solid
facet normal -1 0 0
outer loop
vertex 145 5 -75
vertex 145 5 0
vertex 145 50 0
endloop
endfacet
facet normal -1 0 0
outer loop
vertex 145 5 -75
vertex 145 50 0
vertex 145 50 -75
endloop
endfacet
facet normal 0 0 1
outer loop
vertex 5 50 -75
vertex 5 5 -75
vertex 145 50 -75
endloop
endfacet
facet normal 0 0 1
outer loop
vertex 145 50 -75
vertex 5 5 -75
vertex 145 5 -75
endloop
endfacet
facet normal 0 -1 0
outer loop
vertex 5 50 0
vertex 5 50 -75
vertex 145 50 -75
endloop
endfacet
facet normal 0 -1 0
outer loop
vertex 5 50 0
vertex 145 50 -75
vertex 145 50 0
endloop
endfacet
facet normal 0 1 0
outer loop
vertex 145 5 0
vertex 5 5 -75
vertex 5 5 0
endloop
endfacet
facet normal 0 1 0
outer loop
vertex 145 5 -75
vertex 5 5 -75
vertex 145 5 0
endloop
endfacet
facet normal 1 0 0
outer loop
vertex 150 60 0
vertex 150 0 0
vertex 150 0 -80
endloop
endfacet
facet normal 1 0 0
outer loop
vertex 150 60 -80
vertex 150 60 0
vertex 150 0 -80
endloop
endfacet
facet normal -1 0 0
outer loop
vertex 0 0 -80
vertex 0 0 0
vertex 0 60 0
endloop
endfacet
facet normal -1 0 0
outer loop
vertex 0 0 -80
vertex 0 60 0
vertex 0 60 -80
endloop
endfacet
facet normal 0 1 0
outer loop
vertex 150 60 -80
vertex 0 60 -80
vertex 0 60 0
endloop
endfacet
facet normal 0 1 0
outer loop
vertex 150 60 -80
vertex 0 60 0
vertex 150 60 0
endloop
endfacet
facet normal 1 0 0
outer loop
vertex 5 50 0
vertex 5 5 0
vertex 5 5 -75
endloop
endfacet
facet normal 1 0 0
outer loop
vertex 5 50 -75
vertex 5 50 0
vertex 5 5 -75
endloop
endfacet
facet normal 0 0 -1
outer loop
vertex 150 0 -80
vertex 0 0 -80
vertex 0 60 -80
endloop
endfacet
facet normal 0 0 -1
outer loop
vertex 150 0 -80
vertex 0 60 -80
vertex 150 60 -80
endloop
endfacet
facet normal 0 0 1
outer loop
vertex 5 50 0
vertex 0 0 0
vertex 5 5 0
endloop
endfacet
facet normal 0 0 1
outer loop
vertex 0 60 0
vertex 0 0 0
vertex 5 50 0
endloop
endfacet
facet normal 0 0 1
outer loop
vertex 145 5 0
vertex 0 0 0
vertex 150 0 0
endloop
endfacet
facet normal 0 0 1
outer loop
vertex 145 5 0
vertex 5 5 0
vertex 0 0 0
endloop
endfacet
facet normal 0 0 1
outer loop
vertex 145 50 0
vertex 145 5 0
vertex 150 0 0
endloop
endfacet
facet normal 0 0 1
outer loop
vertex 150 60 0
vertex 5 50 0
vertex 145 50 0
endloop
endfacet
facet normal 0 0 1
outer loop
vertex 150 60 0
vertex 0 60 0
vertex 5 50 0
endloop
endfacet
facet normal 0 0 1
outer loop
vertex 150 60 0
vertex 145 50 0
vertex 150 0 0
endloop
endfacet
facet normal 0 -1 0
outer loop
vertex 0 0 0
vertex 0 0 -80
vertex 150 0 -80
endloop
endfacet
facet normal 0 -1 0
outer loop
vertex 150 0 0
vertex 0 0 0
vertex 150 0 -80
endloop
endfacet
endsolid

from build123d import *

# Parameters (mm, degrees)
SKETCH1_W                 = 150
SKETCH1_H                 = 80
BOSS_EXTRUDE1_DEPTH       = 60
SHELL1_T                  = -5
SHELL1_THICKNESS_2_FACE_W = 75
SHELL1_THICKNESS_2_FACE_H = 140
SHELL1_THICKNESS_2_DEPTH  = 5


with BuildPart() as part:
    # Sketch1 → Boss-Extrude1 (new body)
    with BuildSketch(Plane(origin=(0, 0, 0), x_dir=(1, 0, 0), z_dir=(0, 1, 0))):
        with Locations((75, 40)):
            Rectangle(SKETCH1_W, SKETCH1_H)
    extrude(amount=BOSS_EXTRUDE1_DEPTH)

    # Shell1
    shell1_openings = [part.faces().sort_by_distance(p)[0] for p in [
        (75, 30, 0),
    ]]
    offset(amount=SHELL1_T, openings=shell1_openings, kind=Kind.INTERSECTION)

    # Shell1 thickness 2 face (on inner face of the shell) → Shell1 thickness 2 (add)
    with BuildSketch(Plane(origin=(75, 55, -37.5), x_dir=(0, 0, 1), z_dir=(0, 1, 0))):
        Rectangle(SHELL1_THICKNESS_2_FACE_W, SHELL1_THICKNESS_2_FACE_H)
    extrude(amount=-SHELL1_THICKNESS_2_DEPTH)


solid = part.part
